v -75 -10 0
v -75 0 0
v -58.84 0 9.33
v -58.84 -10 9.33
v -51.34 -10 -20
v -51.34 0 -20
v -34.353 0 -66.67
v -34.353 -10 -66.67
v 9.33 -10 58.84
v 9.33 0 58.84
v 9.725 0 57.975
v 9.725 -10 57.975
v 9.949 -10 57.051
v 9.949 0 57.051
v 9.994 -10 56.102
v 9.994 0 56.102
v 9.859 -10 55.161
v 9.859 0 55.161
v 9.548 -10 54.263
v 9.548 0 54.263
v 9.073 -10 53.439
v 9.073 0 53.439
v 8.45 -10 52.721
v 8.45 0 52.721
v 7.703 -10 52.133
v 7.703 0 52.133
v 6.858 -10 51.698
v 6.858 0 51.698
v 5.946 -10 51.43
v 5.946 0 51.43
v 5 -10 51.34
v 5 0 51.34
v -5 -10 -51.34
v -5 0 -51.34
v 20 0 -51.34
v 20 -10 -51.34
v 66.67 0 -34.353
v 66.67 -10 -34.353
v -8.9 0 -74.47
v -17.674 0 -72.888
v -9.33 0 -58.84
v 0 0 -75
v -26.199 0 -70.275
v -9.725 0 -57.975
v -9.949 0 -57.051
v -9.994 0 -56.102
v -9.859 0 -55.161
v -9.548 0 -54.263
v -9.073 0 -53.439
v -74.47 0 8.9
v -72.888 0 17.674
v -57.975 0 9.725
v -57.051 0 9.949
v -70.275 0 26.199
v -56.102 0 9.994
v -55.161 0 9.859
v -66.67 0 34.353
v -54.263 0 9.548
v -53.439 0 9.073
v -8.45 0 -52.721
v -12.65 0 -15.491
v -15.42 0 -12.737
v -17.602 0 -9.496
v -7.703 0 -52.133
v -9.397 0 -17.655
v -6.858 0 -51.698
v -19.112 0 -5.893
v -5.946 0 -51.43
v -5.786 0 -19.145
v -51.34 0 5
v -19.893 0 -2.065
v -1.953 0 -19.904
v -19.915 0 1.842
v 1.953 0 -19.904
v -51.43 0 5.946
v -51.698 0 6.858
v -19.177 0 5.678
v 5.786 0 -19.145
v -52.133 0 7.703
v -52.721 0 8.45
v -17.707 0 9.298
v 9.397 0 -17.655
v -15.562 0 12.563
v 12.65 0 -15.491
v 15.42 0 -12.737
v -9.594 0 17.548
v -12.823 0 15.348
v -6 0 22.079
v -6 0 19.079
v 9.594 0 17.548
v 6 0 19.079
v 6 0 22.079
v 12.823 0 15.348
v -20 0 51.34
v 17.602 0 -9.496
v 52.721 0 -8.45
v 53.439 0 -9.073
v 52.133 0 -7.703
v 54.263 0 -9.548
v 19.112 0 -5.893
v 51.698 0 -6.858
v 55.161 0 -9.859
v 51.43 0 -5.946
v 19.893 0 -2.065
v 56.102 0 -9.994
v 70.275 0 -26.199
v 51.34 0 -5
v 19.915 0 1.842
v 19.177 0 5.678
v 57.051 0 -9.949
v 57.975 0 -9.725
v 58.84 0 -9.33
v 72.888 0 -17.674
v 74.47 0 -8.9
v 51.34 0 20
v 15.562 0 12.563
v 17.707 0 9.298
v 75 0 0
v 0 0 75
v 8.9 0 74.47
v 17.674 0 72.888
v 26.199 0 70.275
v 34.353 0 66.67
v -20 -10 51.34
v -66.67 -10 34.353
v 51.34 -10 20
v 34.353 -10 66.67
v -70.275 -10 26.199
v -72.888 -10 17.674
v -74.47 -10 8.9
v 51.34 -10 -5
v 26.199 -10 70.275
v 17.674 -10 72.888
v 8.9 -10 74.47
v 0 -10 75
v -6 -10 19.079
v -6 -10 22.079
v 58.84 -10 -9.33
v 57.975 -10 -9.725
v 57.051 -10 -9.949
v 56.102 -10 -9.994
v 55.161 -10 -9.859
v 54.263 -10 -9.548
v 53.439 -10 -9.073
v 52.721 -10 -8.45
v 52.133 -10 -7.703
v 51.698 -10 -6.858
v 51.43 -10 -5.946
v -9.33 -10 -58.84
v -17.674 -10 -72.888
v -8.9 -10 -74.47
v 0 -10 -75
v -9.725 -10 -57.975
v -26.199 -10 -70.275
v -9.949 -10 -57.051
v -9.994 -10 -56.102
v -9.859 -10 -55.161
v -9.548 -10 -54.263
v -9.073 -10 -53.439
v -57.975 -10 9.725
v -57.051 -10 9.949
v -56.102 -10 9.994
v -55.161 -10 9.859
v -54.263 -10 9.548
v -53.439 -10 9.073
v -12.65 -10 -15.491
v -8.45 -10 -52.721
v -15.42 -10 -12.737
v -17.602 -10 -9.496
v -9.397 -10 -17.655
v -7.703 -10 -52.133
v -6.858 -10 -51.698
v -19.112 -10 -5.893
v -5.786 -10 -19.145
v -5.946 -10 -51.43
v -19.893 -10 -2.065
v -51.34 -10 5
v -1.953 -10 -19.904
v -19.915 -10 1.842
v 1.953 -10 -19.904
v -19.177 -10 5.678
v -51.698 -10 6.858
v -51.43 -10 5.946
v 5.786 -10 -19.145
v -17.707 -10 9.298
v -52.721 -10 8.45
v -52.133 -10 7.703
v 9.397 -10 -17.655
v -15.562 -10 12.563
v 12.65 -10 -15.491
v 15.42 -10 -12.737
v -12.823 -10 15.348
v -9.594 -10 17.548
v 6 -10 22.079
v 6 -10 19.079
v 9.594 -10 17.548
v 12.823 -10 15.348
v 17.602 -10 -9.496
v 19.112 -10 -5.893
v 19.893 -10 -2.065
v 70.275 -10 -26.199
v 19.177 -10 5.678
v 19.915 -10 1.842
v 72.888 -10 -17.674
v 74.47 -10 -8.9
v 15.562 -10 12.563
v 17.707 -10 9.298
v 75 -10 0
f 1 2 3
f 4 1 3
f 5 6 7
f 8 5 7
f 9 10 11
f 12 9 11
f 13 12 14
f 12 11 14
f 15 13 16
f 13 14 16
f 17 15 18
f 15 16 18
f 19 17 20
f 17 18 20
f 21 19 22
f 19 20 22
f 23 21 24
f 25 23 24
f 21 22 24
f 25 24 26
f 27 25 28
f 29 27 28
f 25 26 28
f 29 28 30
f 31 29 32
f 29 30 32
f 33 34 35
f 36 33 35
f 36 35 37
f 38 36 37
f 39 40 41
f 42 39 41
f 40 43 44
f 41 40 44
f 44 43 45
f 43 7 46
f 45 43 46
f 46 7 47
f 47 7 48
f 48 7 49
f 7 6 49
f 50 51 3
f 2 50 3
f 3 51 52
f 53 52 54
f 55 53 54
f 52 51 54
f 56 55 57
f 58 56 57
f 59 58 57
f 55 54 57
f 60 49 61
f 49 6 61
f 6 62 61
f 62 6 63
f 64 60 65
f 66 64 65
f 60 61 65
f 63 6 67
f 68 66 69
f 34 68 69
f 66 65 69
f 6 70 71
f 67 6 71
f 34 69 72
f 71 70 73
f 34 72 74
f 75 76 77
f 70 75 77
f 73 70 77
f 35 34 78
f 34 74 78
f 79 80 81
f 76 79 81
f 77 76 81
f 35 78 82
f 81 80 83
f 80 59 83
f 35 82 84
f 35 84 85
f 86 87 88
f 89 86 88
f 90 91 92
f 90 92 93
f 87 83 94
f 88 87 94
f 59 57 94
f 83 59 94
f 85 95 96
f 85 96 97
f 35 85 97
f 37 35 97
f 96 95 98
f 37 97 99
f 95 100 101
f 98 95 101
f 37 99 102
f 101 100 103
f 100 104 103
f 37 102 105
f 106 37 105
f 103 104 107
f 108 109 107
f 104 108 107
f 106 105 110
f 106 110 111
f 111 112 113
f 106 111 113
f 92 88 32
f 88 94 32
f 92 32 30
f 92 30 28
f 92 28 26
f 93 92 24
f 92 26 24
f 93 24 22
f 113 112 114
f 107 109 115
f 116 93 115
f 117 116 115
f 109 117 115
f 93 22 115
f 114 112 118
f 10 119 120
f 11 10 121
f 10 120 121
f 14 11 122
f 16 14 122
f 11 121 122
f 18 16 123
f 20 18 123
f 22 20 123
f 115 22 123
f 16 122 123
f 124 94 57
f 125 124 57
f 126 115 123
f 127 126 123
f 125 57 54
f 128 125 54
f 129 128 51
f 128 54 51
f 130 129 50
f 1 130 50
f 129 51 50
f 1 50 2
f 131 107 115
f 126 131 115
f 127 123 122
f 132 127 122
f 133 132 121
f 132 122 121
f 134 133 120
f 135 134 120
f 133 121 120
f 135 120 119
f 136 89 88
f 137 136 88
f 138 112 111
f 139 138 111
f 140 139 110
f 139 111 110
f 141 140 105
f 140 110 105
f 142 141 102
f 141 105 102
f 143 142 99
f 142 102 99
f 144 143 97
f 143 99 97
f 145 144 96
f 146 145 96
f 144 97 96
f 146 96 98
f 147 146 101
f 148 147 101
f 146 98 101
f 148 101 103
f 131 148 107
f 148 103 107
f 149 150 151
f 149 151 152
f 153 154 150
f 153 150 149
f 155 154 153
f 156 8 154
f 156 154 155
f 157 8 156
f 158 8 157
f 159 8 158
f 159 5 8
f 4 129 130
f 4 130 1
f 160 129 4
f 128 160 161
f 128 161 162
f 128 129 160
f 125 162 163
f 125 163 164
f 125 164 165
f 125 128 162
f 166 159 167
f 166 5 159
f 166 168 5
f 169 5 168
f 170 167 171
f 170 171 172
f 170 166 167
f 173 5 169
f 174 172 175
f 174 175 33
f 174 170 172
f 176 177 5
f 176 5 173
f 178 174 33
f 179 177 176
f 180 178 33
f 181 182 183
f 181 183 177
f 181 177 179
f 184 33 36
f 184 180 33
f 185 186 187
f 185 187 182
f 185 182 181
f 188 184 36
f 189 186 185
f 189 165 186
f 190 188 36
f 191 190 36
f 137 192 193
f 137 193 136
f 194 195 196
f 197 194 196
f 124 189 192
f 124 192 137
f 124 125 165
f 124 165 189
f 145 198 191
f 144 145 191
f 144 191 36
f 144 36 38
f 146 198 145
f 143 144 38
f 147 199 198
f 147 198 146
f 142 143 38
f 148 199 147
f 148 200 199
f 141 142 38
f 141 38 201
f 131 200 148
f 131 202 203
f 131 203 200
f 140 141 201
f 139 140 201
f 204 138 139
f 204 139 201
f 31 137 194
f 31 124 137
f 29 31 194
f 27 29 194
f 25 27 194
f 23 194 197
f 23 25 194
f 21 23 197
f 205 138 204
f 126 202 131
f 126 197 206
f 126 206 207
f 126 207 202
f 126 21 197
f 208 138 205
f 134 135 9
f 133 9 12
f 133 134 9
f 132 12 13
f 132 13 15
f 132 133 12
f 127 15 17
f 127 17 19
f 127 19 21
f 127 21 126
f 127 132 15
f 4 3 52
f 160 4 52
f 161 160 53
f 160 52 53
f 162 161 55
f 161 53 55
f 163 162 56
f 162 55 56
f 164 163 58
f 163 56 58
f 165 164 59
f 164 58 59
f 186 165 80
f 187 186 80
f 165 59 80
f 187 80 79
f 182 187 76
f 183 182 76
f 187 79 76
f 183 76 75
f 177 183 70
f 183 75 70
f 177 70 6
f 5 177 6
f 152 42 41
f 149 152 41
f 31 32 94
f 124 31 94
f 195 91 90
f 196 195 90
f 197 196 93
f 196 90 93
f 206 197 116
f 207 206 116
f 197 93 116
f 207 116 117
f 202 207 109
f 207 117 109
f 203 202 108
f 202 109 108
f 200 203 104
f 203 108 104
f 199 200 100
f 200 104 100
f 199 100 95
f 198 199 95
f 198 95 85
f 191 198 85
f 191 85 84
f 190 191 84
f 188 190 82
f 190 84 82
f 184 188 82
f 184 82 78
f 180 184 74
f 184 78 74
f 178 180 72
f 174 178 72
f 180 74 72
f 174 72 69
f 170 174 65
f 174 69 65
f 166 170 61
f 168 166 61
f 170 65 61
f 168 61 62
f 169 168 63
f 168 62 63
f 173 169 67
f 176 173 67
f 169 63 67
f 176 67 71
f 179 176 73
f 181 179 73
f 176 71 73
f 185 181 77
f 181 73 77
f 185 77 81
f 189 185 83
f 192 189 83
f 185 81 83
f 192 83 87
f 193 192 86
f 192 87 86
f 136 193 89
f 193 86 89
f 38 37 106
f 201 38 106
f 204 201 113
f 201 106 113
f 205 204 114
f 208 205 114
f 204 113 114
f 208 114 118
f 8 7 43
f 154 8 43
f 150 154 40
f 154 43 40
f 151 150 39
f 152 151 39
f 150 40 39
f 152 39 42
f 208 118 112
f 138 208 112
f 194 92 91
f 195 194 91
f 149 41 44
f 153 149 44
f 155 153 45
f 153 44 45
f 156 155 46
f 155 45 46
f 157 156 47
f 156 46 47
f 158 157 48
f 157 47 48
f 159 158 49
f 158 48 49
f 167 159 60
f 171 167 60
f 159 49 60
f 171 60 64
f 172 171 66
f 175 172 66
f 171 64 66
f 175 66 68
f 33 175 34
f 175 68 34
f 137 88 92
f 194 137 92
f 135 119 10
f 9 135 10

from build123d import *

# Parameters (mm, degrees)
F1_DEPTH = 10


with BuildPart() as f1:
    # F0 (on Front) → F1 (new body)
    with BuildSketch(Plane.XZ):
        with BuildLine():
            Line((-20, 51.339746), (-66.669677, 34.353373))
            ThreePointArc((-66.669677, 34.353373), (-72.887673, 17.674477), (-75, 0))
            Line((-75, 0), (-58.839746, 9.330127))
            ThreePointArc((-58.839746, 9.330127), (-53.839746, 9.330127), (-51.339746, 5))
            Line((-51.339746, 5), (-51.339746, -20))
            Line((-51.339746, -20), (-34.353373, -66.669677))
            ThreePointArc((-34.353373, -66.669677), (-17.674477, -72.887673), (0, -75))
            Line((0, -75), (-9.330127, -58.839746))
            ThreePointArc((-9.330127, -58.839746), (-9.330127, -53.839746), (-5, -51.339746))
            Line((-5, -51.339746), (20, -51.339746))
            Line((20, -51.339746), (66.669677, -34.353373))
            ThreePointArc((66.669677, -34.353373), (72.887673, -17.674477), (75, 0))
            Line((75, 0), (58.839746, -9.330127))
            ThreePointArc((58.839746, -9.330127), (53.839746, -9.330127), (51.339746, -5))
            Line((51.339746, -5), (51.339746, 20))
            Line((51.339746, 20), (34.353373, 66.669677))
            ThreePointArc((34.353373, 66.669677), (17.674477, 72.887673), (0, 75))
            Line((0, 75), (9.330127, 58.839746))
            ThreePointArc((9.330127, 58.839746), (9.330127, 53.839746), (5, 51.339746))
            Line((5, 51.339746), (0, 51.339746))
            Line((0, 51.339746), (-20, 51.339746))
        make_face()
        with BuildLine():
            Line((-6, 22.078784), (0, 22.078784))
            Line((0, 22.078784), (6, 22.078784))
            Line((6, 22.078784), (6, 19.078784))
            ThreePointArc((6, 19.078784), (0, -20), (-6, 19.078784))
            Line((-6, 19.078784), (-6, 22.078784))
        make_face(mode=Mode.SUBTRACT)
    extrude(amount=F1_DEPTH)


solid = f1.part
